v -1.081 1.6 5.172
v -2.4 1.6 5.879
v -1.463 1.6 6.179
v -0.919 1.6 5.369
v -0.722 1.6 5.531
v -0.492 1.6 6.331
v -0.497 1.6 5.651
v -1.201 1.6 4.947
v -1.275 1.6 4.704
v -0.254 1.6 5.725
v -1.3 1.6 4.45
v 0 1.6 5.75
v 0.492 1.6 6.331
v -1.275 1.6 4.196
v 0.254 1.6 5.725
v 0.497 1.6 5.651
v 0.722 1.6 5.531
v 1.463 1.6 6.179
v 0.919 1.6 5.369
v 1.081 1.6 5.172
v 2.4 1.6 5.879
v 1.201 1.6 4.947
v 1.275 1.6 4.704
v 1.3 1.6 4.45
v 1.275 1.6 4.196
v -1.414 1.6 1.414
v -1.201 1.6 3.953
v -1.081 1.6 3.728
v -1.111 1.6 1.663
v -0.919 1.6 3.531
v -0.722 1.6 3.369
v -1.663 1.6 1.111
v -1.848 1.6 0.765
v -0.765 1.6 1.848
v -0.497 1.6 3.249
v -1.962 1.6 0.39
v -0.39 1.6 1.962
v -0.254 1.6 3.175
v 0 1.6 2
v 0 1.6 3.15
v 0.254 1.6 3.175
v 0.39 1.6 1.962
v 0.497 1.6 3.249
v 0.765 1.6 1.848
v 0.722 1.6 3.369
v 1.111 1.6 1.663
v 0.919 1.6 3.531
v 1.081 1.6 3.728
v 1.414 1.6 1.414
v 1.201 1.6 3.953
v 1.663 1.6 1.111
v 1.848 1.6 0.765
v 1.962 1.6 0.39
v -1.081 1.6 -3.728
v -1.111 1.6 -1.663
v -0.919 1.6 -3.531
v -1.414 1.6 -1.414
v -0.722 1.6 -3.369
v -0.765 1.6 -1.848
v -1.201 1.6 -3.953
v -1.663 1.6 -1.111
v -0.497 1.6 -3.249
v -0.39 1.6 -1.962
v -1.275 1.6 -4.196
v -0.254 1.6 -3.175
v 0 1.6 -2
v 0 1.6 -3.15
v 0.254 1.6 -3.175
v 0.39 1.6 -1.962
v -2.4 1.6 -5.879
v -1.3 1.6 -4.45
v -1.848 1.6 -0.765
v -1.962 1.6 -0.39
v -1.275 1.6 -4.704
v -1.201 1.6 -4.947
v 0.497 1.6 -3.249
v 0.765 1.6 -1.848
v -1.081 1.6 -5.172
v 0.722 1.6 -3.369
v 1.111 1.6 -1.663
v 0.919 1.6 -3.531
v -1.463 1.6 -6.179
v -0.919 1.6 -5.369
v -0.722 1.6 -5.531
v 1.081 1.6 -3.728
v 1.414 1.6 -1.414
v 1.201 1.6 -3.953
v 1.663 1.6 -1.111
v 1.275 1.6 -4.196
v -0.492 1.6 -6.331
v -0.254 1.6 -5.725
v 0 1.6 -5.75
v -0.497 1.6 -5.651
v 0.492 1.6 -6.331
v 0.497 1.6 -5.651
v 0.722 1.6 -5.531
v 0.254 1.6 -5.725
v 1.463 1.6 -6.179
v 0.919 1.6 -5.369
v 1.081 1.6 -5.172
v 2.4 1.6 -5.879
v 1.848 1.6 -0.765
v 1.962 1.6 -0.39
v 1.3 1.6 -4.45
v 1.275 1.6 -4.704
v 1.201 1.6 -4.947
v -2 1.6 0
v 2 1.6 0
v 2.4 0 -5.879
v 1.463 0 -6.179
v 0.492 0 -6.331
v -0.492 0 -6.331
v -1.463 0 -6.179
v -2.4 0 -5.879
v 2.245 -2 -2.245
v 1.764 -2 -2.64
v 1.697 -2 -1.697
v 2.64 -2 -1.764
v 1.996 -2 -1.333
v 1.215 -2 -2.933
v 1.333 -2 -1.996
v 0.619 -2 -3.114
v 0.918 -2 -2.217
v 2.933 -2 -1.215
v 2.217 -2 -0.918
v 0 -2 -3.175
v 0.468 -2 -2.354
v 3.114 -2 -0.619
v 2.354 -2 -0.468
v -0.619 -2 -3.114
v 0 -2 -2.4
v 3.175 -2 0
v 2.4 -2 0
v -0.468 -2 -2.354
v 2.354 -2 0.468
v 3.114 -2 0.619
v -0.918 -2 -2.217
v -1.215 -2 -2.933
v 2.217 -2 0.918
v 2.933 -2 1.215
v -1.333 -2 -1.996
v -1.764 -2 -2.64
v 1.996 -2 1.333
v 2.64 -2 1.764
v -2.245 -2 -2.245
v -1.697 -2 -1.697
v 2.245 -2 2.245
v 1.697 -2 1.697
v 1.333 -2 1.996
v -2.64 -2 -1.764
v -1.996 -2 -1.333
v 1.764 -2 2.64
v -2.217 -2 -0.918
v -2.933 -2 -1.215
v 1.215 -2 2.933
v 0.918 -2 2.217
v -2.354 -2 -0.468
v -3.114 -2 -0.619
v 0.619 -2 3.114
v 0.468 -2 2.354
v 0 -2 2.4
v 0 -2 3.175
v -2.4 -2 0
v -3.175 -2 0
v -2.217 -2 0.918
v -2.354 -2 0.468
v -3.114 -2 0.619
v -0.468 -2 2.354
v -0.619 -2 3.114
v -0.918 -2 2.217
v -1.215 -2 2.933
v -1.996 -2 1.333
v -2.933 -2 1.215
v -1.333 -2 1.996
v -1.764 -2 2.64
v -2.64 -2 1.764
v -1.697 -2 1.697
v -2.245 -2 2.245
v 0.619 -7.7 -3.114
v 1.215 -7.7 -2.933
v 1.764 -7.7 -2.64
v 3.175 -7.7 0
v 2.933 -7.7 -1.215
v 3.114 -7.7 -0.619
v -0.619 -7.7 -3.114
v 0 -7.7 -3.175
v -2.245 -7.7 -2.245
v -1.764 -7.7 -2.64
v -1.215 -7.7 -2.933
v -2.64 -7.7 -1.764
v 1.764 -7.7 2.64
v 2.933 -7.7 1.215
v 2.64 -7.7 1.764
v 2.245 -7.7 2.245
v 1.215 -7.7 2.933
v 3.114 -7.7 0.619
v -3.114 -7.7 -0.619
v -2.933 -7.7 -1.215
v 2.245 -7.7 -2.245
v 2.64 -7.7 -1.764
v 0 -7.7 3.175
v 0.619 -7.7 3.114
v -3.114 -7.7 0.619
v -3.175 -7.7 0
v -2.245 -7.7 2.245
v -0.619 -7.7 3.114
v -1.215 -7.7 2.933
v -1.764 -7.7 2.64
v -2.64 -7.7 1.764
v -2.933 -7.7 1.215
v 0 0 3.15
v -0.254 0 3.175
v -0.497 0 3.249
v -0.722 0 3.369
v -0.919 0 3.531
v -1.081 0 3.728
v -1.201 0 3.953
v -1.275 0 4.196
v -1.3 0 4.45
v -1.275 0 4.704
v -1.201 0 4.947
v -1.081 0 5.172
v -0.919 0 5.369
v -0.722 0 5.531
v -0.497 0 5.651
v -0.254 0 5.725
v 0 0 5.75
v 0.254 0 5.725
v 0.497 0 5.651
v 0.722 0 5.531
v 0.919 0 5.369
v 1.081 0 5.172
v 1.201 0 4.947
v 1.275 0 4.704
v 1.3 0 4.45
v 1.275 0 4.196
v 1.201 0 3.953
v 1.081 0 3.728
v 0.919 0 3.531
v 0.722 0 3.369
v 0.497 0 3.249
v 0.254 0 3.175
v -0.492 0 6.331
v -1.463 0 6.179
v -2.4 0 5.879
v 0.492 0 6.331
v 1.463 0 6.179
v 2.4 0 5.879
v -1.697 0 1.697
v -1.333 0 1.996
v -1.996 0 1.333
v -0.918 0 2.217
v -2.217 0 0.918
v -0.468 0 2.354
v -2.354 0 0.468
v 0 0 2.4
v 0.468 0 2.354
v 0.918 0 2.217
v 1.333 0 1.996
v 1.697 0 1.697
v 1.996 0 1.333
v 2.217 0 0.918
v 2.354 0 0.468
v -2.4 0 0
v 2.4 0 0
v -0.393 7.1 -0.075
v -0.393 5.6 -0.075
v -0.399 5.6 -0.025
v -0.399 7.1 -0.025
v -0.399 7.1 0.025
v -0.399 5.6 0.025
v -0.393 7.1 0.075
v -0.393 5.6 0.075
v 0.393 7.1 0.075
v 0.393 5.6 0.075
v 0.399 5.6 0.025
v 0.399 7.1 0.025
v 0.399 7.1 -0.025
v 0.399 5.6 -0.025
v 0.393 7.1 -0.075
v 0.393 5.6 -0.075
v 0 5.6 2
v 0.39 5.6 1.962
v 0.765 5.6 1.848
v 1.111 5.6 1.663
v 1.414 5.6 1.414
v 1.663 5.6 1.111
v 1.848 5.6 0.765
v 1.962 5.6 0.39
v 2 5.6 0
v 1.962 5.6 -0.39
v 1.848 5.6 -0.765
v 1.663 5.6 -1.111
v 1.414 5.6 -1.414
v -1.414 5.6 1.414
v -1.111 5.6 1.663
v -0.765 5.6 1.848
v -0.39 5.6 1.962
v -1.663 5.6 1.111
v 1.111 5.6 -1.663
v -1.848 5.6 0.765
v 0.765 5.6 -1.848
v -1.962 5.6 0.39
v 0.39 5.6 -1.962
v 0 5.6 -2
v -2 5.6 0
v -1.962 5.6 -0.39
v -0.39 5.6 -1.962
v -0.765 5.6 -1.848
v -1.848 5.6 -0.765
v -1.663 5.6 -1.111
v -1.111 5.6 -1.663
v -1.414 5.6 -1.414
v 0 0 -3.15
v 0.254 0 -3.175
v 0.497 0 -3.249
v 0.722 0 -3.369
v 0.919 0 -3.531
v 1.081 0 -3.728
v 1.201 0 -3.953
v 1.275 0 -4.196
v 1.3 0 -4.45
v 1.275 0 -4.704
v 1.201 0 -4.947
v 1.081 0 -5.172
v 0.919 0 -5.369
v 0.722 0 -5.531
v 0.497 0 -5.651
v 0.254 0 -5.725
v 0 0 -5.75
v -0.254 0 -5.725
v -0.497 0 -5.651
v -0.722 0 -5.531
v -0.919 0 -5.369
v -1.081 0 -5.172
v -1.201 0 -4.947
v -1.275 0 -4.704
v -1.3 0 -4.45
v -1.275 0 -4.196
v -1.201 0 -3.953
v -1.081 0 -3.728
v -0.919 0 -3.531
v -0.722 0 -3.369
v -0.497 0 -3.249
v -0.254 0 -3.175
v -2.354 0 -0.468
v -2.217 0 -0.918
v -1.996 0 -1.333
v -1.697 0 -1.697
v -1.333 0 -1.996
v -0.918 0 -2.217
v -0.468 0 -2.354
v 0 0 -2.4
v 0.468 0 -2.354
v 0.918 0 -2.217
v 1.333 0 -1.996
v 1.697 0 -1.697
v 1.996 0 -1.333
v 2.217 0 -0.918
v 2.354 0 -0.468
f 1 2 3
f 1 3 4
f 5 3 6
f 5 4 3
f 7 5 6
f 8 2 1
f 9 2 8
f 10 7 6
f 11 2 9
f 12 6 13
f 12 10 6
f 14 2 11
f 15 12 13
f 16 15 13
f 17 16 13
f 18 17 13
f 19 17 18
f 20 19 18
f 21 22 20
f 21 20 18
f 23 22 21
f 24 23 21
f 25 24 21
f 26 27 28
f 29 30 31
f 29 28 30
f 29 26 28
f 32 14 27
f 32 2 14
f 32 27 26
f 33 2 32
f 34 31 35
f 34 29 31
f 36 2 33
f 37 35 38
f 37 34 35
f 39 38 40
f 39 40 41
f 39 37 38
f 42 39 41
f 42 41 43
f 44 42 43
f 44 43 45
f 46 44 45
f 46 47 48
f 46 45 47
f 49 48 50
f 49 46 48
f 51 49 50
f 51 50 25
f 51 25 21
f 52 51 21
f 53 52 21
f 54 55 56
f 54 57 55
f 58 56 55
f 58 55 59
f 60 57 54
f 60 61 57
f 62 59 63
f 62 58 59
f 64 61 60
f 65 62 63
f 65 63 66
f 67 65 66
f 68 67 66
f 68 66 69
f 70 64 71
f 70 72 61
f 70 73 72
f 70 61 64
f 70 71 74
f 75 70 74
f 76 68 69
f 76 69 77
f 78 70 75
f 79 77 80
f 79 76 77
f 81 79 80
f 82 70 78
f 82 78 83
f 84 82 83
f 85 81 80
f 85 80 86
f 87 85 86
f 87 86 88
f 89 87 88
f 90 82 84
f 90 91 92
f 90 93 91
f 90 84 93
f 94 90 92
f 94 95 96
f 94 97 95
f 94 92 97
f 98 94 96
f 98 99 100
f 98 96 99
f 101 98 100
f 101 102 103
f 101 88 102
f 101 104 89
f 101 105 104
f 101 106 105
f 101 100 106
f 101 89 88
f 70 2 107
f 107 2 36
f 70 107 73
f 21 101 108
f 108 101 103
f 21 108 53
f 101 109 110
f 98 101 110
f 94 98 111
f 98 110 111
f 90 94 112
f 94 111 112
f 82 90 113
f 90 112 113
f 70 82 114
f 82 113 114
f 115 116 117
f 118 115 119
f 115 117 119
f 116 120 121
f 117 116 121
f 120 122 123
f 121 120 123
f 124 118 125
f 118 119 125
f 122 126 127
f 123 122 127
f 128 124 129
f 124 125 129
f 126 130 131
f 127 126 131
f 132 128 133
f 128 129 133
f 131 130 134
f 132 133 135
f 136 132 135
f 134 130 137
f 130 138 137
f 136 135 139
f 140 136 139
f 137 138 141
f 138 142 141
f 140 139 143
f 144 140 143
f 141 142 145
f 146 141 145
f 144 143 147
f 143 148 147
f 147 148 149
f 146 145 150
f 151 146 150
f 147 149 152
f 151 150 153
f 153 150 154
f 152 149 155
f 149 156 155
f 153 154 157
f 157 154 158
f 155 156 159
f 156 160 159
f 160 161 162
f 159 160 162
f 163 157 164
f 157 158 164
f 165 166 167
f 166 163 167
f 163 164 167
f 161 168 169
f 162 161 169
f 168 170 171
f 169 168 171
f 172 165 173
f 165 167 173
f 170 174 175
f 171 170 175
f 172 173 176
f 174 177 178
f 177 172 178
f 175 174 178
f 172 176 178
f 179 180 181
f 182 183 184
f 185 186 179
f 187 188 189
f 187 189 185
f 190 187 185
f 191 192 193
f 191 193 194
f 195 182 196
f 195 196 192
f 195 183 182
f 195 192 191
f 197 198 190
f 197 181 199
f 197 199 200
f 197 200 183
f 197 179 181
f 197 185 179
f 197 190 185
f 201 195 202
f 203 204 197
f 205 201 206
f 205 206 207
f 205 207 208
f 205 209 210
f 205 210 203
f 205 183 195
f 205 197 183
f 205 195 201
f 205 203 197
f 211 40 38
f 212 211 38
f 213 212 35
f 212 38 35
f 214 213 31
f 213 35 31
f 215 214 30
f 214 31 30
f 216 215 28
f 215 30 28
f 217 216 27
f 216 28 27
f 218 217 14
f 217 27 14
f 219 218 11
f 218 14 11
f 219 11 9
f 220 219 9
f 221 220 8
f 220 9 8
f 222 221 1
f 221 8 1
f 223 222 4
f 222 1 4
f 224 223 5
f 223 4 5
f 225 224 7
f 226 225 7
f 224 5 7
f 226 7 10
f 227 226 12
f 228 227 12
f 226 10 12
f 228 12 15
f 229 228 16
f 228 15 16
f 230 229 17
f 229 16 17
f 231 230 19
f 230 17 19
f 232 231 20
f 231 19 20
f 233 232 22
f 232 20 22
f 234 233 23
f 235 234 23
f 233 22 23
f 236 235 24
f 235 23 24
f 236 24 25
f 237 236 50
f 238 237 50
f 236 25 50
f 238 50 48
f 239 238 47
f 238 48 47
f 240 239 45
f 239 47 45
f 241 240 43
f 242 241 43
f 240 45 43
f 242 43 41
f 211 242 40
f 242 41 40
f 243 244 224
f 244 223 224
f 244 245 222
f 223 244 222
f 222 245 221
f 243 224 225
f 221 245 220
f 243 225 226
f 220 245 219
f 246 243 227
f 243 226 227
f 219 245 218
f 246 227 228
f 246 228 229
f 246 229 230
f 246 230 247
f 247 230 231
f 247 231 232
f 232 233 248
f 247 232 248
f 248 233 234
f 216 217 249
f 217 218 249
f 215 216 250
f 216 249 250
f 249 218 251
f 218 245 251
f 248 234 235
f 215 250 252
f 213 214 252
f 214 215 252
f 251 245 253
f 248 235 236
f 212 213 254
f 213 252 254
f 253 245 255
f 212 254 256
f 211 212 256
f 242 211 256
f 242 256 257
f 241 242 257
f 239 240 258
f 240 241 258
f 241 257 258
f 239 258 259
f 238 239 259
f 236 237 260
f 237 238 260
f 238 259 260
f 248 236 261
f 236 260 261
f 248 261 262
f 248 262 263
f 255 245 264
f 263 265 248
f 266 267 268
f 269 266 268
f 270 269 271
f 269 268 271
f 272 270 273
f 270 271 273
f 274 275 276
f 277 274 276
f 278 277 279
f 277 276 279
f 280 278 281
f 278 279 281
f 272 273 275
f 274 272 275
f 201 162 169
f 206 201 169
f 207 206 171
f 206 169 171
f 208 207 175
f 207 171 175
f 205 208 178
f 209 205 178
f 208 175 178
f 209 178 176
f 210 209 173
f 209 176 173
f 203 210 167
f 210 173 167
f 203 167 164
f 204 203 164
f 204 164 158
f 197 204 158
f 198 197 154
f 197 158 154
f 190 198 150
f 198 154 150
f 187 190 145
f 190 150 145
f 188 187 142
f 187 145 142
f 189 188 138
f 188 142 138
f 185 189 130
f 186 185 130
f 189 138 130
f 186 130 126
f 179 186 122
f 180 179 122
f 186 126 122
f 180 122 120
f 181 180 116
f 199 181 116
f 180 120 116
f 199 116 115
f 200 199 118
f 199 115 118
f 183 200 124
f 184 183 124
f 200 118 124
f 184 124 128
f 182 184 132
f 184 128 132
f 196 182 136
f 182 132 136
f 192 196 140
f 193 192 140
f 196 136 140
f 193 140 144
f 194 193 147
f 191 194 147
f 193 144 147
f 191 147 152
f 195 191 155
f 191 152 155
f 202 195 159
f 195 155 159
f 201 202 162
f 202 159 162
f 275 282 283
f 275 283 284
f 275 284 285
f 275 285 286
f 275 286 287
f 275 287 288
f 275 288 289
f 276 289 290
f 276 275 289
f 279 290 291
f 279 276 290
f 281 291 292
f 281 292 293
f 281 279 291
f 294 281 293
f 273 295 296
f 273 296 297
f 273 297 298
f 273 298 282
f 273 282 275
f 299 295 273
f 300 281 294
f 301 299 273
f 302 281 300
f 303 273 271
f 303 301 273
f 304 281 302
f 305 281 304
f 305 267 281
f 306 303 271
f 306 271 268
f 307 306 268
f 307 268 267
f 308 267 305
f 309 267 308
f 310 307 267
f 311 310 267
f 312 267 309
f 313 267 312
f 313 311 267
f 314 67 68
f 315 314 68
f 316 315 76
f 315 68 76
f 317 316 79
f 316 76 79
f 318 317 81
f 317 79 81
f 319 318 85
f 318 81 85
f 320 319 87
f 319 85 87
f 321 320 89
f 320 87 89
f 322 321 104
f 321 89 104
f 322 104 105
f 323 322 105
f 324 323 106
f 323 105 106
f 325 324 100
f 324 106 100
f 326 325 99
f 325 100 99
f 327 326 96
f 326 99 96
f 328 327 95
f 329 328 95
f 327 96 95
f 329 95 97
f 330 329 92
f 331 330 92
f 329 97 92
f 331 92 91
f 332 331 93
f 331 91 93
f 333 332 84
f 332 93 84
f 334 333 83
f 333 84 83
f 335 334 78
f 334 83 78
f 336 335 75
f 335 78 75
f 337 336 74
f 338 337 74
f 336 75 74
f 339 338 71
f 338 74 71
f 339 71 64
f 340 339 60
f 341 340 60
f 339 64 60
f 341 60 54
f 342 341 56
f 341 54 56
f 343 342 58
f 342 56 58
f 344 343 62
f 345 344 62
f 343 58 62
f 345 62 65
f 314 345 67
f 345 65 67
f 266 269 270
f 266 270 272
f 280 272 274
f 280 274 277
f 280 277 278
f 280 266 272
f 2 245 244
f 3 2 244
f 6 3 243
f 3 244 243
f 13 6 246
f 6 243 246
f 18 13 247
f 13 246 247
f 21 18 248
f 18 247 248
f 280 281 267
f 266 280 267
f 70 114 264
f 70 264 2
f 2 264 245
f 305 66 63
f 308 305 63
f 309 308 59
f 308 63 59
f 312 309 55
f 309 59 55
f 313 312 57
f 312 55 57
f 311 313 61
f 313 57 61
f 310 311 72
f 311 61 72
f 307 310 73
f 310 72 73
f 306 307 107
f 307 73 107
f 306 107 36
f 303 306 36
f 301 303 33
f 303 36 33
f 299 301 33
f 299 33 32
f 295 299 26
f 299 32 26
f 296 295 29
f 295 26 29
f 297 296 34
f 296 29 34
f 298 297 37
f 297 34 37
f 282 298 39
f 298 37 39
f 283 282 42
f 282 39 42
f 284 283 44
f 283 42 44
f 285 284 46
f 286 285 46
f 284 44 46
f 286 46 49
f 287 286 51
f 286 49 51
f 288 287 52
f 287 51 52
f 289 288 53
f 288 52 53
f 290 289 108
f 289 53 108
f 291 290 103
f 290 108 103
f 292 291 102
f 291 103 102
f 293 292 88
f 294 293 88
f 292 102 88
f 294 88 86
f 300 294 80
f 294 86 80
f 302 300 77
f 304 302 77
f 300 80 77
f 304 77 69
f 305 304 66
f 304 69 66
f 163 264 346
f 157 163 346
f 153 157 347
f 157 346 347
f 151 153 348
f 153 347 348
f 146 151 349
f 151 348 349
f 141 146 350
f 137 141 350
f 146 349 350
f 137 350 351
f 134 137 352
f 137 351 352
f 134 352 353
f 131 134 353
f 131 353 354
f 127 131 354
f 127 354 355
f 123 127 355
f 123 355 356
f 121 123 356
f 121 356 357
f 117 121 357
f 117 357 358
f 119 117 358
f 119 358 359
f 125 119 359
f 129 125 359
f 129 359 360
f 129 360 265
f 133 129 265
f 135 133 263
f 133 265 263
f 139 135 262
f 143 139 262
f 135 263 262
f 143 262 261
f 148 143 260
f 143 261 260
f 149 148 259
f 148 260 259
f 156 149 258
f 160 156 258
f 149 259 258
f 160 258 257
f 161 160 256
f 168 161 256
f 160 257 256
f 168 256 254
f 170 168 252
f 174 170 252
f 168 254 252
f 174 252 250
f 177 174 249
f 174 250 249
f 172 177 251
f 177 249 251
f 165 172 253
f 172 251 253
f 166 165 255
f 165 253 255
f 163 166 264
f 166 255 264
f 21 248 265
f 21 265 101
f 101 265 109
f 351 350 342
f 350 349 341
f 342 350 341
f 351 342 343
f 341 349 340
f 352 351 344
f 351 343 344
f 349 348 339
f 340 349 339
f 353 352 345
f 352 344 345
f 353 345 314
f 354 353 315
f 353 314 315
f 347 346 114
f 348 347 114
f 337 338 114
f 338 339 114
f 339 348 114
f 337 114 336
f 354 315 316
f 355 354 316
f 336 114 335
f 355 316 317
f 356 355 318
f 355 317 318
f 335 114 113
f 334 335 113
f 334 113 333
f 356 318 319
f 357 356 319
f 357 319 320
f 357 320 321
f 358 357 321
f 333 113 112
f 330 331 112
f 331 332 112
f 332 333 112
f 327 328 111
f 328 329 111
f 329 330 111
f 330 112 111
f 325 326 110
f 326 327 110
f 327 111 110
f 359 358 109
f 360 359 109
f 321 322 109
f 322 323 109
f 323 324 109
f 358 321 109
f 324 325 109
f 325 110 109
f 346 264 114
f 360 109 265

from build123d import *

# Parameters (mm, degrees)
BOSS_EXTRUDE1_DEPTH = 1.6
SKETCH2_R           = 1.3
CUT_EXTRUDE1_DEPTH  = 1.6
SKETCH3_R           = 2
BOSS_EXTRUDE2_DEPTH = 4
BOSS_EXTRUDE3_DEPTH = 1.5
SKETCH5_R           = 2.4
BOSS_EXTRUDE5_DEPTH = 2
SKETCH6_R           = 3.175
BOSS_EXTRUDE7_DEPTH = 5.7


with BuildPart() as part:
    # Sketch1 → Boss-Extrude1 (new body)
    with BuildSketch(Plane(origin=(0, 0, 0), x_dir=(1, 0, 0), z_dir=(0, 1, 0))):
        with BuildLine():
            Line((-2.4, 5.878988008), (-2.4, -5.878988008))
            ThreePointArc((-2.4, -5.878988008), (0, -6.35), (2.4, -5.878988008))
            Line((2.4, -5.878988008), (2.4, 5.878988008))
            ThreePointArc((2.4, 5.878988008), (0, 6.35), (-2.4, 5.878988008))
        make_face()
    extrude(amount=BOSS_EXTRUDE1_DEPTH)

    # Sketch2 → Cut-Extrude1 (cut)
    with BuildSketch(Plane(origin=(0, 1.6, 0), x_dir=(1, 0, 0), z_dir=(0, 1, 0))):
        with Locations(Location((0, 4.45, 0), (0, 0, 270))):
            Circle(SKETCH2_R)
        with Locations(Location((0, -4.45, 0), (0, 0, 90))):
            Circle(SKETCH2_R)
    extrude(amount=-CUT_EXTRUDE1_DEPTH, mode=Mode.SUBTRACT)

    # Sketch3 → Boss-Extrude2 (add)
    with BuildSketch(Plane(origin=(0, 1.6, 0), x_dir=(1, 0, 0), z_dir=(0, 1, 0))):
        with Locations(Location((0, 0, 0), (0, 0, 90))):
            Circle(SKETCH3_R)
    extrude(amount=BOSS_EXTRUDE2_DEPTH)

    # Sketch4 → Boss-Extrude3 (add)
    with BuildSketch(Plane(origin=(0, 5.6, 0), x_dir=(1, 0, 0), z_dir=(0, 1, 0))):
        with BuildLine():
            Line((0.392905841, 0.075), (-0.392905841, 0.075))
            ThreePointArc((-0.392905841, 0.075), (-0.4, 0), (-0.392905841, -0.075))
            Line((-0.392905841, -0.075), (0.392905841, -0.075))
            ThreePointArc((0.392905841, -0.075), (0.4, 0), (0.392905841, 0.075))
        make_face()
    extrude(amount=BOSS_EXTRUDE3_DEPTH)

    # Sketch5 → Boss-Extrude5 (add)
    with BuildSketch(Plane.XZ):
        with Locations(Location((0, 0, 0), (0, 0, 180))):
            Circle(SKETCH5_R)
    extrude(amount=BOSS_EXTRUDE5_DEPTH)

    # Sketch6 → Boss-Extrude7 (add)
    with BuildSketch(Plane.XZ.offset(2)):
        with Locations(Location((0, 0, 0), (0, 0, 90))):
            Circle(SKETCH6_R)
    extrude(amount=BOSS_EXTRUDE7_DEPTH)


solid = part.part
